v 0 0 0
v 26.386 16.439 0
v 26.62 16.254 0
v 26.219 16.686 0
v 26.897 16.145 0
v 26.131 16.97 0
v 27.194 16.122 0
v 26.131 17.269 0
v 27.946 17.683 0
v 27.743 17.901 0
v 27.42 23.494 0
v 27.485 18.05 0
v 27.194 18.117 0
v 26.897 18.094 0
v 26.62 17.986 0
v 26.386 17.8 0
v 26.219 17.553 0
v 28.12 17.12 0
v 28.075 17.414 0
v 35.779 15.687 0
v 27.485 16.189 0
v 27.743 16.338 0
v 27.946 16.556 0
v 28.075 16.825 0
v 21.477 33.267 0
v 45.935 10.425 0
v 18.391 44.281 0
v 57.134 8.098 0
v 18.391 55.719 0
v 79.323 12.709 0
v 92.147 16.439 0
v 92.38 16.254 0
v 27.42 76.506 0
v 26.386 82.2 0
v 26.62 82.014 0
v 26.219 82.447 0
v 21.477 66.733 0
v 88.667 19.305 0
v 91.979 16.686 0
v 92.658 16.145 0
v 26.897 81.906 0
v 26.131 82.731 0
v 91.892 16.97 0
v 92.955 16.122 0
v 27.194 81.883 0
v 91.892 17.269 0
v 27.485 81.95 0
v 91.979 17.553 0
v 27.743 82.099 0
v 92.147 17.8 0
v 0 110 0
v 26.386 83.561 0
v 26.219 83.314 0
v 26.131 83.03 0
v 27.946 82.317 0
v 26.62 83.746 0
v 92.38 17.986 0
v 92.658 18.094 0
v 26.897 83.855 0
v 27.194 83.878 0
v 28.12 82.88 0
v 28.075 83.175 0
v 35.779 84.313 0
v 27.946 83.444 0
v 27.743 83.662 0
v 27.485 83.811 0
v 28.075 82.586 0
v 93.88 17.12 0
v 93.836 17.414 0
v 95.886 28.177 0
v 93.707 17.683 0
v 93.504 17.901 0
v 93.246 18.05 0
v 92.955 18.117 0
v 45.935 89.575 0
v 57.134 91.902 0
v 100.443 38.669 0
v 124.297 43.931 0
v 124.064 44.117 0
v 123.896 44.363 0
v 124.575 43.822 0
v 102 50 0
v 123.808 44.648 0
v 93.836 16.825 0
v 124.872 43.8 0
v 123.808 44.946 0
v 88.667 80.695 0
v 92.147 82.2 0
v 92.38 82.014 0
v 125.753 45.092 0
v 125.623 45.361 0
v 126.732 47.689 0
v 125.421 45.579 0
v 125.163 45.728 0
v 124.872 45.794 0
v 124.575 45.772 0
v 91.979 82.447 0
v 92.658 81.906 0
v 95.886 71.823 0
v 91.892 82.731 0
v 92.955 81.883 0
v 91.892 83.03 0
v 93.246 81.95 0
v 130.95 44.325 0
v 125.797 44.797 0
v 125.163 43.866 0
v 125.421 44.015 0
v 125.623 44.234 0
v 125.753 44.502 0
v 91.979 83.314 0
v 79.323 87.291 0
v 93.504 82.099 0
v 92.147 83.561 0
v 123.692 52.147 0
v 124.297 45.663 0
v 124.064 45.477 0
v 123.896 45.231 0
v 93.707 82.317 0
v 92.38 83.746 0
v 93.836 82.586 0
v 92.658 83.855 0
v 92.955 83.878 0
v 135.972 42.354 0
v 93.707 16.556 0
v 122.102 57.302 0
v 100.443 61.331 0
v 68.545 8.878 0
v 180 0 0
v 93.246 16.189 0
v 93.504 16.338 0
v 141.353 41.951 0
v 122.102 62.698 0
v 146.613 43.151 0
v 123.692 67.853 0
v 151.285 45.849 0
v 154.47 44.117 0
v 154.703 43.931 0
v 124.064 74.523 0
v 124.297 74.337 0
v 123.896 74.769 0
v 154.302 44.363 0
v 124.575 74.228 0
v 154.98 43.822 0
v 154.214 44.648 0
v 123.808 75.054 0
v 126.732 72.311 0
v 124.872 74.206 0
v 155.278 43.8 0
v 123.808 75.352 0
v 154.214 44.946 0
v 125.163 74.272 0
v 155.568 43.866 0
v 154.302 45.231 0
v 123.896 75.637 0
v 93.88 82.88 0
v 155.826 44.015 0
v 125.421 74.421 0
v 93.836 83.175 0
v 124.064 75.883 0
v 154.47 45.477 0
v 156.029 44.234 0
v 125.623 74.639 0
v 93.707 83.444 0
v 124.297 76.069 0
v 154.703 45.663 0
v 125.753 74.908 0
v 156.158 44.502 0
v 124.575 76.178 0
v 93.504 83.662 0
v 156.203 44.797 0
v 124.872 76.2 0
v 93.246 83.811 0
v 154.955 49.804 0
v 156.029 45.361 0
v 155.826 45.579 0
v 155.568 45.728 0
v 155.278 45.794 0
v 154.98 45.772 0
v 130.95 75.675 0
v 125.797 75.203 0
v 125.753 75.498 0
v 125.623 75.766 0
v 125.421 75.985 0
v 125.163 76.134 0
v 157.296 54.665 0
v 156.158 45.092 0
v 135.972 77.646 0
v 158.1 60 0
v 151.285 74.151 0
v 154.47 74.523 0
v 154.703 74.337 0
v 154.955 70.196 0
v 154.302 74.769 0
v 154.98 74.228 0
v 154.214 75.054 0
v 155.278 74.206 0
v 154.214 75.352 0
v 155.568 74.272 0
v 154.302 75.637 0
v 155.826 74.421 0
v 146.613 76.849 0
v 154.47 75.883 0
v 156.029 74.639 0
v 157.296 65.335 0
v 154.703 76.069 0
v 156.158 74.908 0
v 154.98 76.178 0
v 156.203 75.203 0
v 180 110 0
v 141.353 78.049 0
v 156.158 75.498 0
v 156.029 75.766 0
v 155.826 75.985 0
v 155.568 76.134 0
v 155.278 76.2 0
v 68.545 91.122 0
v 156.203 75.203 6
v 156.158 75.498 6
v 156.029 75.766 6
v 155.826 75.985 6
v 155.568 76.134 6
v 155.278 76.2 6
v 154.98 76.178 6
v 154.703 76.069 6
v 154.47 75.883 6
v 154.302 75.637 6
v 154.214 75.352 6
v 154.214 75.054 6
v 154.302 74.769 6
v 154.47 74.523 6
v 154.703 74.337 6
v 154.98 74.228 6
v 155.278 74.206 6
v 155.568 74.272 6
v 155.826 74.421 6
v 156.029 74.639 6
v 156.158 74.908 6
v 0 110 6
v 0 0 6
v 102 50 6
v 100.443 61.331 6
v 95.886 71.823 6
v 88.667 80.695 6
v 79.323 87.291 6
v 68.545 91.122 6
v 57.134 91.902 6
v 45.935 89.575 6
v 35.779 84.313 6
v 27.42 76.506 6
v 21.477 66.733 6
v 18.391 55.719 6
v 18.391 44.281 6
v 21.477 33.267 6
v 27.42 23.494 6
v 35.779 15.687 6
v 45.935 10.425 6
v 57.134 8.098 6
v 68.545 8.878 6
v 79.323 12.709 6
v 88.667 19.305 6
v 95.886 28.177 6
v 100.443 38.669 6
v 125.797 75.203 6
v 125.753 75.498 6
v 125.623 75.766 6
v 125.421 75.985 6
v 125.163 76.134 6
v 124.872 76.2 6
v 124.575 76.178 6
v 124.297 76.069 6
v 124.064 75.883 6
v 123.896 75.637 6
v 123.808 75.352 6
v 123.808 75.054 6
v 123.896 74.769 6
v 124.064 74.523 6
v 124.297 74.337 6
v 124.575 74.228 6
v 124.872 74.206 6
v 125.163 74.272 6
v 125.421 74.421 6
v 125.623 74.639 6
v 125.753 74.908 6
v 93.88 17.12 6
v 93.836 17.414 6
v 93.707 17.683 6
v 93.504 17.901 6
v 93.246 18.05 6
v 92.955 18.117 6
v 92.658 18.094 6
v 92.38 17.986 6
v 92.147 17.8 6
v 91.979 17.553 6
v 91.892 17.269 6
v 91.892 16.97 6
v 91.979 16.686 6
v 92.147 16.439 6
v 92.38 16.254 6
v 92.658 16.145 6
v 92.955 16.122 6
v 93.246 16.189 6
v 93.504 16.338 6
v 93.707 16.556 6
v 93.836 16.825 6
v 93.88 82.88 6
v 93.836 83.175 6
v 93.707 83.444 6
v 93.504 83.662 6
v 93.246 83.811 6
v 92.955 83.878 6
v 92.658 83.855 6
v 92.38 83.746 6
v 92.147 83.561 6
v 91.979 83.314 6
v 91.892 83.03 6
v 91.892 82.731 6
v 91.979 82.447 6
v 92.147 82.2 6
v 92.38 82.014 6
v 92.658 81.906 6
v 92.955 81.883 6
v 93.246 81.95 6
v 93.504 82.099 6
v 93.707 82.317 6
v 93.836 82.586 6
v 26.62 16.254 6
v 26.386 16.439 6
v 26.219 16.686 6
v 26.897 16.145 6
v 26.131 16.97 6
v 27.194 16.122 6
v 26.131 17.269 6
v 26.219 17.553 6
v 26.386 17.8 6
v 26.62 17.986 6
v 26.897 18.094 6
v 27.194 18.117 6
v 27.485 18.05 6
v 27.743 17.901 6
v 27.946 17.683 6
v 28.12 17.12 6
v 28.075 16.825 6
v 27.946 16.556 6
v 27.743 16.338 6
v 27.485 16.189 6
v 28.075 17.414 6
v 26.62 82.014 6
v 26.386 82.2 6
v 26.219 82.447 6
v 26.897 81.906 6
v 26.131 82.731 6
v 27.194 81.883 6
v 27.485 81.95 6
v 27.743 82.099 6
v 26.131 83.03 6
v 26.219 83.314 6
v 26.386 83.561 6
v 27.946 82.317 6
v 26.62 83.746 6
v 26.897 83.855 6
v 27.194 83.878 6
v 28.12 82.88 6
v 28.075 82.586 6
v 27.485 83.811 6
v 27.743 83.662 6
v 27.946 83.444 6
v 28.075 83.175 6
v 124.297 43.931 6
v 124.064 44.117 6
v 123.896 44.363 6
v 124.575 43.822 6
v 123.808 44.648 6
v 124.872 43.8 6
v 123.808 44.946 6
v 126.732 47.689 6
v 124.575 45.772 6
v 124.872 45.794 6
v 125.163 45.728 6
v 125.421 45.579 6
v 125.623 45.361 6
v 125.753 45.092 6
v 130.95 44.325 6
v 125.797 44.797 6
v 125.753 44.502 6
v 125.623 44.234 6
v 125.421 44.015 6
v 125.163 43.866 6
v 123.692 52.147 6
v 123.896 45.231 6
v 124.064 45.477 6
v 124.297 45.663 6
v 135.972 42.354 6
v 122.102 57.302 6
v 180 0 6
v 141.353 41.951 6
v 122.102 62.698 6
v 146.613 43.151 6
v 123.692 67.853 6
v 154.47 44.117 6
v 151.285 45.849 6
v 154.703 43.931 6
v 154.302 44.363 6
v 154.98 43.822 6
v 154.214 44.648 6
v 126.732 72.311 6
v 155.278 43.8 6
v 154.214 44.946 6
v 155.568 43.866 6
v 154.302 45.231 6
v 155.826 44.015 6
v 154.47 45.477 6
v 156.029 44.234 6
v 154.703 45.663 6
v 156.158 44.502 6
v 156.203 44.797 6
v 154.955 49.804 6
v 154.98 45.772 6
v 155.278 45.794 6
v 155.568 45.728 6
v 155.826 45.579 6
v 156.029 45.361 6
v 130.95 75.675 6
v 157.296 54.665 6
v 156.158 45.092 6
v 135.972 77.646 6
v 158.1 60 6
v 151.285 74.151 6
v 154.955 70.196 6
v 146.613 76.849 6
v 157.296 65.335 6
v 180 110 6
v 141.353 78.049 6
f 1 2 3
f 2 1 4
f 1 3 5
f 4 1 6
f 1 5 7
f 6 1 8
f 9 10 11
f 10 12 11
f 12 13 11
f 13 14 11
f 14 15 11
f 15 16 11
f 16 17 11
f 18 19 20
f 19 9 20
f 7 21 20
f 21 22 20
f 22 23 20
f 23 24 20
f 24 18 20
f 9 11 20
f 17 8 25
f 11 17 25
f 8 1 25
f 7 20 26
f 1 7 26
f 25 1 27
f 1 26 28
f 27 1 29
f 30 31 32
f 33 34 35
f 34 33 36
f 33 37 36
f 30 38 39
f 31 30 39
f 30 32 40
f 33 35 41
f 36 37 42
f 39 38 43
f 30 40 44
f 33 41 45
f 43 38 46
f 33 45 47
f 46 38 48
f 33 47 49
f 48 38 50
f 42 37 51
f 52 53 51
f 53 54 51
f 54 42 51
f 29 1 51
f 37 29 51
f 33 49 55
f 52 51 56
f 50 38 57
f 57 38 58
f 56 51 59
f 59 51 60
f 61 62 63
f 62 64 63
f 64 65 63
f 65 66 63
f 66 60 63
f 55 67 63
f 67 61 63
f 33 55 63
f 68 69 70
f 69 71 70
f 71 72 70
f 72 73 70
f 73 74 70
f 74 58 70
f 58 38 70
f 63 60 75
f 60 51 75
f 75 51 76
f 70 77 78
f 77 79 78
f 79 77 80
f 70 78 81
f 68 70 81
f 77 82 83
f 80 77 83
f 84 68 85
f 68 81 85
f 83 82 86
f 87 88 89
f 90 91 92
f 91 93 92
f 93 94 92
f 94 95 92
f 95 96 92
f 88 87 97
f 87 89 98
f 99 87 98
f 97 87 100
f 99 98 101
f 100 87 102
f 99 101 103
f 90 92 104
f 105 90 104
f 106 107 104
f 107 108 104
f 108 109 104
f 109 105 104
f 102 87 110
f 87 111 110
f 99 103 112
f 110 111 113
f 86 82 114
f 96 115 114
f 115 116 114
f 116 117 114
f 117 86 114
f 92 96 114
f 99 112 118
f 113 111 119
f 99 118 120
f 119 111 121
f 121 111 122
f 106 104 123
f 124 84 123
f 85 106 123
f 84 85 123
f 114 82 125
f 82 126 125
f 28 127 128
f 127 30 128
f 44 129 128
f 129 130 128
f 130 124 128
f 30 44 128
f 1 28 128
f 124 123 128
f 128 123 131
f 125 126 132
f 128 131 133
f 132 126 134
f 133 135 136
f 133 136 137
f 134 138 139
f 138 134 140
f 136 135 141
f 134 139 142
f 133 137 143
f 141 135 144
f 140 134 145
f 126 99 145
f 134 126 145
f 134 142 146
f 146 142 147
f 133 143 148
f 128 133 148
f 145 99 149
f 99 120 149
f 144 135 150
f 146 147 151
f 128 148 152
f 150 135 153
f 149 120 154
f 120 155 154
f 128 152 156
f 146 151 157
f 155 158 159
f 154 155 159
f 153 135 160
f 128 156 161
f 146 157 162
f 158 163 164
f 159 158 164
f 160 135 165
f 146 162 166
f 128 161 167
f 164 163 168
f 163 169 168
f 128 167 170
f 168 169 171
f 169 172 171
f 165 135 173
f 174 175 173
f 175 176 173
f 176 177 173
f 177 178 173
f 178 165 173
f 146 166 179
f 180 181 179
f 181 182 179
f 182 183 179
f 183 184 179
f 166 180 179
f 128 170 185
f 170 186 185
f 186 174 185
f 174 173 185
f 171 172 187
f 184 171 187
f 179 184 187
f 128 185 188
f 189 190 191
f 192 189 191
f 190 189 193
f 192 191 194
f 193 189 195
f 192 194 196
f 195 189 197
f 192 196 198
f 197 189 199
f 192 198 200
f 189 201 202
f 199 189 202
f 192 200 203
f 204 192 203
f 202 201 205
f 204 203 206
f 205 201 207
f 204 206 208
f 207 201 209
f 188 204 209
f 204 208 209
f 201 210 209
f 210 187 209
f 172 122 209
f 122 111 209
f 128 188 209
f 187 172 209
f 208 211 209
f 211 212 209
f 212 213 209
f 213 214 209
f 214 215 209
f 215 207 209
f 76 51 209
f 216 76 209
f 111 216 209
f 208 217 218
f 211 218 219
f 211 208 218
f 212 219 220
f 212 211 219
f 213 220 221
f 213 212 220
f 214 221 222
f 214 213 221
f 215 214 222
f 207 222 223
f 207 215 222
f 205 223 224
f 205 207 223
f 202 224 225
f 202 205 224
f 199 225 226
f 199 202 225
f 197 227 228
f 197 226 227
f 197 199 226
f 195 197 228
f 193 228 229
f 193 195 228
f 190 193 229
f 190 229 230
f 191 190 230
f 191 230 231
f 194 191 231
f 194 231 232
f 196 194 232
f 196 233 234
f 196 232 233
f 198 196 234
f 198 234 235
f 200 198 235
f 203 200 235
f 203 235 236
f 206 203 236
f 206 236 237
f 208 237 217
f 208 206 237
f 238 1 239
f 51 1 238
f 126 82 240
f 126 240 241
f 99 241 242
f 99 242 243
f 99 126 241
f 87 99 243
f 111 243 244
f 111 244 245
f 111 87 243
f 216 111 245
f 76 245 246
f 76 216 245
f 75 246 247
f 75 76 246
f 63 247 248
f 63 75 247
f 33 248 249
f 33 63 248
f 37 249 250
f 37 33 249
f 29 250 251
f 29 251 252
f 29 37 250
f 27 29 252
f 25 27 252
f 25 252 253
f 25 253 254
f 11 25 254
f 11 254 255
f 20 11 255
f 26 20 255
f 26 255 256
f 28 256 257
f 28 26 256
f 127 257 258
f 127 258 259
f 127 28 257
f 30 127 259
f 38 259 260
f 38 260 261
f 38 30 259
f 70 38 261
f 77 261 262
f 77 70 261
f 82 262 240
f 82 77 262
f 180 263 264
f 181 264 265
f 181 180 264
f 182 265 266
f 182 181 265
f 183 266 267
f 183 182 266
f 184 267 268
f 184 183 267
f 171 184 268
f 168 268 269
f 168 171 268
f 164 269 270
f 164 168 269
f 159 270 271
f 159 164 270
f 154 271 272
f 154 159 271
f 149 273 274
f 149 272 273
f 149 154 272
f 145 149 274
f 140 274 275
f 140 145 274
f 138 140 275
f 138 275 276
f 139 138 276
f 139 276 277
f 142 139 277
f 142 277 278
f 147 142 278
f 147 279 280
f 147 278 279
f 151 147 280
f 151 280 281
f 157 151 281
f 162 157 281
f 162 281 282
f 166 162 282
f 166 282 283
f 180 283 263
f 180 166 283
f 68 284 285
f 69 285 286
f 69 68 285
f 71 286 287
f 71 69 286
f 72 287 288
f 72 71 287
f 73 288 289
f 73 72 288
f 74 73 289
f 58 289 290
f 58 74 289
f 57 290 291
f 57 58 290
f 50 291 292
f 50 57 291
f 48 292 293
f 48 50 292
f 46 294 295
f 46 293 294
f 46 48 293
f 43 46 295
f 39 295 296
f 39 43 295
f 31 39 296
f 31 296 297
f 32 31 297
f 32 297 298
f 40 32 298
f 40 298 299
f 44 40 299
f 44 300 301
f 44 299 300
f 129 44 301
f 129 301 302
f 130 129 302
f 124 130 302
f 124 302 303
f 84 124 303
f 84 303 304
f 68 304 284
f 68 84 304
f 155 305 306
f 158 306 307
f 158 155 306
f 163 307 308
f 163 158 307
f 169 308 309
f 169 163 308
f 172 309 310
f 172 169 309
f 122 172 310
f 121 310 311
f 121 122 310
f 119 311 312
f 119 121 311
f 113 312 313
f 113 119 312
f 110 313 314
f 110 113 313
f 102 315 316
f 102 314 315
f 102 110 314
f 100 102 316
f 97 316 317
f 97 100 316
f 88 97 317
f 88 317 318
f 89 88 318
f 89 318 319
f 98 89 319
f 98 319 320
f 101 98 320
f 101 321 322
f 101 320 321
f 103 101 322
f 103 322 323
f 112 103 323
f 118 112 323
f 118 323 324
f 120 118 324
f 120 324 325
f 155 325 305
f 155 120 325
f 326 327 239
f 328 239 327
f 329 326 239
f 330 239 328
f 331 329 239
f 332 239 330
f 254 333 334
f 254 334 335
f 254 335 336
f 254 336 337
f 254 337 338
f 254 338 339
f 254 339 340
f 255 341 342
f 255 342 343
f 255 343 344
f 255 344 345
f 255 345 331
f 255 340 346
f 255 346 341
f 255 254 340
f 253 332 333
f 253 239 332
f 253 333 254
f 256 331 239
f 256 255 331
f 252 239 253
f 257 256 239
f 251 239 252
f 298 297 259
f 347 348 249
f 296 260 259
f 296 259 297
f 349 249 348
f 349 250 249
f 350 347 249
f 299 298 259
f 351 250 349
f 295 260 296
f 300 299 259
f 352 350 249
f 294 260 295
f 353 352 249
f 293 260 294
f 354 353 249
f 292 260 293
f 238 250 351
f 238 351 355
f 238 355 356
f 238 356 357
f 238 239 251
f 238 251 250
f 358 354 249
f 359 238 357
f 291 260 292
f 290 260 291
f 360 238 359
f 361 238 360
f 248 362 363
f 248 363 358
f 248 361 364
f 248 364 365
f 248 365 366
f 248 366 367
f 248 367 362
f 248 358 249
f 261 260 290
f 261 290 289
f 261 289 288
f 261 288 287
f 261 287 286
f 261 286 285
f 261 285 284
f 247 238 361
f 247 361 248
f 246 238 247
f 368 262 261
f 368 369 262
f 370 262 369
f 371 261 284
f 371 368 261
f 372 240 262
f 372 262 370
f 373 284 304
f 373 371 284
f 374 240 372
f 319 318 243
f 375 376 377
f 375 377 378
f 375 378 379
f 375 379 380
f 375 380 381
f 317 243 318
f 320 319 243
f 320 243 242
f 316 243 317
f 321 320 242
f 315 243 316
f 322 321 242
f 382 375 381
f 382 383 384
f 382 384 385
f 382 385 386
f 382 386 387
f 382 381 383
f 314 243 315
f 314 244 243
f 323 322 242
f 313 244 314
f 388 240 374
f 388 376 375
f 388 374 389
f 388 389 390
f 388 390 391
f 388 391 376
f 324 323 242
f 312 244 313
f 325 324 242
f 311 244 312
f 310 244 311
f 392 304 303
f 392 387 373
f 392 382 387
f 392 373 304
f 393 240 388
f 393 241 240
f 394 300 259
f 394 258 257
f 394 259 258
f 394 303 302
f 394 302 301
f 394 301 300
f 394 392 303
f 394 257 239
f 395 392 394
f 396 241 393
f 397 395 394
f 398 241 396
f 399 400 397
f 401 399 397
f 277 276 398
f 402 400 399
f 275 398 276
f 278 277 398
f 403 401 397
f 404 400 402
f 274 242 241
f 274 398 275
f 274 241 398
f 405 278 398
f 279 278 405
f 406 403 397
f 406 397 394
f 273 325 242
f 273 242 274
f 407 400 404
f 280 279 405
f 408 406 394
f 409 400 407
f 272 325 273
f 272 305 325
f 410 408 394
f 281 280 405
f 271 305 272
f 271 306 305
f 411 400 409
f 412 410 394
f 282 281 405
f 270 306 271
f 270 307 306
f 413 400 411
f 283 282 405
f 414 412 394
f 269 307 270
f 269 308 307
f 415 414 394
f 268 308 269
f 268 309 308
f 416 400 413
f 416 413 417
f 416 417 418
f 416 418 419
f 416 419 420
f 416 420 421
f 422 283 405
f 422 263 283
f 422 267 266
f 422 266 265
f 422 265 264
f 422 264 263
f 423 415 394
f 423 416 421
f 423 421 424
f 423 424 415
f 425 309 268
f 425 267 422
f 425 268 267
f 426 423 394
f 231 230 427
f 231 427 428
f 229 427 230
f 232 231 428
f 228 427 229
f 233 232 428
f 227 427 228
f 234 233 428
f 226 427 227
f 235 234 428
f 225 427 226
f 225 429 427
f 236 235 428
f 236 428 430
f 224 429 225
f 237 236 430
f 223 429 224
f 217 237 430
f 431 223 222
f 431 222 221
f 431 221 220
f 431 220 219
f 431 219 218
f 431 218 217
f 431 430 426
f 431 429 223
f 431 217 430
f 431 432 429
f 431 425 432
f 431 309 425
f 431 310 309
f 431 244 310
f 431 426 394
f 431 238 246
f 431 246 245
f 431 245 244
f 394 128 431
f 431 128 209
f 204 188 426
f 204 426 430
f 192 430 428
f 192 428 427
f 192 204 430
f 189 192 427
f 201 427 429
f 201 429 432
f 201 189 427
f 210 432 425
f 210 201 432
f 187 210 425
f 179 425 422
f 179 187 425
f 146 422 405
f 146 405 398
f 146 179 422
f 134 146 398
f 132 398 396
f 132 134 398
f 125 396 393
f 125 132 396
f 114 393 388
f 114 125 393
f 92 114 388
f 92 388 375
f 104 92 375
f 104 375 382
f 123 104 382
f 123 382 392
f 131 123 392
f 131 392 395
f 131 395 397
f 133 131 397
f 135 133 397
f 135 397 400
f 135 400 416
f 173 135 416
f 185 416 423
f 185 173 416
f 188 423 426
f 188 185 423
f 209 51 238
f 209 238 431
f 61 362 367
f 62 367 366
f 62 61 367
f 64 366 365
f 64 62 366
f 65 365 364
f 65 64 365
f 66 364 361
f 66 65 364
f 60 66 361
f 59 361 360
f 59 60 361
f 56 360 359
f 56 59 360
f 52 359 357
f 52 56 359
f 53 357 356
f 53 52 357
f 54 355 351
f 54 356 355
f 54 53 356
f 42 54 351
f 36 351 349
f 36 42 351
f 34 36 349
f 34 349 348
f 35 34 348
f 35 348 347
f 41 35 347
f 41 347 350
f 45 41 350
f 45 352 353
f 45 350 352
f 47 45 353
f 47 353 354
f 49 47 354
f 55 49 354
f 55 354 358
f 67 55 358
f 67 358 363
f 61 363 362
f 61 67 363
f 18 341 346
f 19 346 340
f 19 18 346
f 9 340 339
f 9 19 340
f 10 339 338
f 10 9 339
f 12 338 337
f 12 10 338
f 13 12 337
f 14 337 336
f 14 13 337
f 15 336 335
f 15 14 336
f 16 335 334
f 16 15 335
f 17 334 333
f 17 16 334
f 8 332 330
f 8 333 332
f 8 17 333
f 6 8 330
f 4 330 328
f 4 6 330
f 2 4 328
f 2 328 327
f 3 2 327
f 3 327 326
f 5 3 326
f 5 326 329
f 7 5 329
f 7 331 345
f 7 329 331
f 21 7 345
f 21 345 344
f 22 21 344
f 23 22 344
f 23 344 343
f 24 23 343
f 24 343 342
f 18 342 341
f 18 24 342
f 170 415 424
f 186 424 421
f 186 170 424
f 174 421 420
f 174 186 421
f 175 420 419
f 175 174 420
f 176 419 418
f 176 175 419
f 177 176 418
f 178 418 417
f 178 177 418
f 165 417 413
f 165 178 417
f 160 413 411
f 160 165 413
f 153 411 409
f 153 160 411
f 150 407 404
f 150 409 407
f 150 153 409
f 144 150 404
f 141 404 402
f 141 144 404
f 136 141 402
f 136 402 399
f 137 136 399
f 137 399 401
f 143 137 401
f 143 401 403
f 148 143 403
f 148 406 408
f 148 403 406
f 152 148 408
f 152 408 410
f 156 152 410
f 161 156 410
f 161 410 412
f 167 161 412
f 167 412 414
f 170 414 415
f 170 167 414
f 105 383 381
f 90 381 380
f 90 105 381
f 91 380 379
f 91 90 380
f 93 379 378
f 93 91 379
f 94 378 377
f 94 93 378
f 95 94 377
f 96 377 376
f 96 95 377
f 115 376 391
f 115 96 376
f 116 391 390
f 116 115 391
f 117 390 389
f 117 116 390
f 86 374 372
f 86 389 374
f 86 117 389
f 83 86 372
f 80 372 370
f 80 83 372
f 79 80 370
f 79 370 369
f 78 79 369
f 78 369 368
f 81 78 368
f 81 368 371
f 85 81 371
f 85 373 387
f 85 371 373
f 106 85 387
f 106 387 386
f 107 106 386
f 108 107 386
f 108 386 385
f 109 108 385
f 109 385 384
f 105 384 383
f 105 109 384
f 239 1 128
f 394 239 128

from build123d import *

# Parameters (mm, degrees)
SKETCH1_W           = 180
SKETCH1_H           = 110
SKETCH1_R           = 42
SKETCH1_R_2         = 18.1
BOSS_EXTRUDE1_DEPTH = 6
SKETCH3_R           = 1
CUT_EXTRUDE1_DEPTH  = 30


with BuildPart() as part:
    # Sketch1 → Boss-Extrude1 (new body)
    with BuildSketch(Plane.XY):
        with Locations((90, 55)):
            Rectangle(SKETCH1_W, SKETCH1_H)
        with Locations((60, 50)):
            Circle(SKETCH1_R, mode=Mode.SUBTRACT)
        with Locations((140, 60)):
            Circle(SKETCH1_R_2, mode=Mode.SUBTRACT)
    extrude(amount=BOSS_EXTRUDE1_DEPTH)

    # Sketch3 → Cut-Extrude1 (cut)
    with BuildSketch(Plane.XY):
        with Locations((92.880465325, 82.880465325)):
            Circle(SKETCH3_R)
        with Locations((27.119534675, 82.880465325)):
            Circle(SKETCH3_R)
        with Locations((27.119534675, 17.119534675)):
            Circle(SKETCH3_R)
        with Locations((92.880465325, 17.119534675)):
            Circle(SKETCH3_R)
        with Locations((155.202795796, 75.202795796)):
            Circle(SKETCH3_R)
        with Locations((124.797204204, 75.202795796)):
            Circle(SKETCH3_R)
        with Locations((124.797204204, 44.797204204)):
            Circle(SKETCH3_R)
        with Locations((155.202795796, 44.797204204)):
            Circle(SKETCH3_R)
    extrude(amount=CUT_EXTRUDE1_DEPTH, mode=Mode.SUBTRACT)


solid = part.part
